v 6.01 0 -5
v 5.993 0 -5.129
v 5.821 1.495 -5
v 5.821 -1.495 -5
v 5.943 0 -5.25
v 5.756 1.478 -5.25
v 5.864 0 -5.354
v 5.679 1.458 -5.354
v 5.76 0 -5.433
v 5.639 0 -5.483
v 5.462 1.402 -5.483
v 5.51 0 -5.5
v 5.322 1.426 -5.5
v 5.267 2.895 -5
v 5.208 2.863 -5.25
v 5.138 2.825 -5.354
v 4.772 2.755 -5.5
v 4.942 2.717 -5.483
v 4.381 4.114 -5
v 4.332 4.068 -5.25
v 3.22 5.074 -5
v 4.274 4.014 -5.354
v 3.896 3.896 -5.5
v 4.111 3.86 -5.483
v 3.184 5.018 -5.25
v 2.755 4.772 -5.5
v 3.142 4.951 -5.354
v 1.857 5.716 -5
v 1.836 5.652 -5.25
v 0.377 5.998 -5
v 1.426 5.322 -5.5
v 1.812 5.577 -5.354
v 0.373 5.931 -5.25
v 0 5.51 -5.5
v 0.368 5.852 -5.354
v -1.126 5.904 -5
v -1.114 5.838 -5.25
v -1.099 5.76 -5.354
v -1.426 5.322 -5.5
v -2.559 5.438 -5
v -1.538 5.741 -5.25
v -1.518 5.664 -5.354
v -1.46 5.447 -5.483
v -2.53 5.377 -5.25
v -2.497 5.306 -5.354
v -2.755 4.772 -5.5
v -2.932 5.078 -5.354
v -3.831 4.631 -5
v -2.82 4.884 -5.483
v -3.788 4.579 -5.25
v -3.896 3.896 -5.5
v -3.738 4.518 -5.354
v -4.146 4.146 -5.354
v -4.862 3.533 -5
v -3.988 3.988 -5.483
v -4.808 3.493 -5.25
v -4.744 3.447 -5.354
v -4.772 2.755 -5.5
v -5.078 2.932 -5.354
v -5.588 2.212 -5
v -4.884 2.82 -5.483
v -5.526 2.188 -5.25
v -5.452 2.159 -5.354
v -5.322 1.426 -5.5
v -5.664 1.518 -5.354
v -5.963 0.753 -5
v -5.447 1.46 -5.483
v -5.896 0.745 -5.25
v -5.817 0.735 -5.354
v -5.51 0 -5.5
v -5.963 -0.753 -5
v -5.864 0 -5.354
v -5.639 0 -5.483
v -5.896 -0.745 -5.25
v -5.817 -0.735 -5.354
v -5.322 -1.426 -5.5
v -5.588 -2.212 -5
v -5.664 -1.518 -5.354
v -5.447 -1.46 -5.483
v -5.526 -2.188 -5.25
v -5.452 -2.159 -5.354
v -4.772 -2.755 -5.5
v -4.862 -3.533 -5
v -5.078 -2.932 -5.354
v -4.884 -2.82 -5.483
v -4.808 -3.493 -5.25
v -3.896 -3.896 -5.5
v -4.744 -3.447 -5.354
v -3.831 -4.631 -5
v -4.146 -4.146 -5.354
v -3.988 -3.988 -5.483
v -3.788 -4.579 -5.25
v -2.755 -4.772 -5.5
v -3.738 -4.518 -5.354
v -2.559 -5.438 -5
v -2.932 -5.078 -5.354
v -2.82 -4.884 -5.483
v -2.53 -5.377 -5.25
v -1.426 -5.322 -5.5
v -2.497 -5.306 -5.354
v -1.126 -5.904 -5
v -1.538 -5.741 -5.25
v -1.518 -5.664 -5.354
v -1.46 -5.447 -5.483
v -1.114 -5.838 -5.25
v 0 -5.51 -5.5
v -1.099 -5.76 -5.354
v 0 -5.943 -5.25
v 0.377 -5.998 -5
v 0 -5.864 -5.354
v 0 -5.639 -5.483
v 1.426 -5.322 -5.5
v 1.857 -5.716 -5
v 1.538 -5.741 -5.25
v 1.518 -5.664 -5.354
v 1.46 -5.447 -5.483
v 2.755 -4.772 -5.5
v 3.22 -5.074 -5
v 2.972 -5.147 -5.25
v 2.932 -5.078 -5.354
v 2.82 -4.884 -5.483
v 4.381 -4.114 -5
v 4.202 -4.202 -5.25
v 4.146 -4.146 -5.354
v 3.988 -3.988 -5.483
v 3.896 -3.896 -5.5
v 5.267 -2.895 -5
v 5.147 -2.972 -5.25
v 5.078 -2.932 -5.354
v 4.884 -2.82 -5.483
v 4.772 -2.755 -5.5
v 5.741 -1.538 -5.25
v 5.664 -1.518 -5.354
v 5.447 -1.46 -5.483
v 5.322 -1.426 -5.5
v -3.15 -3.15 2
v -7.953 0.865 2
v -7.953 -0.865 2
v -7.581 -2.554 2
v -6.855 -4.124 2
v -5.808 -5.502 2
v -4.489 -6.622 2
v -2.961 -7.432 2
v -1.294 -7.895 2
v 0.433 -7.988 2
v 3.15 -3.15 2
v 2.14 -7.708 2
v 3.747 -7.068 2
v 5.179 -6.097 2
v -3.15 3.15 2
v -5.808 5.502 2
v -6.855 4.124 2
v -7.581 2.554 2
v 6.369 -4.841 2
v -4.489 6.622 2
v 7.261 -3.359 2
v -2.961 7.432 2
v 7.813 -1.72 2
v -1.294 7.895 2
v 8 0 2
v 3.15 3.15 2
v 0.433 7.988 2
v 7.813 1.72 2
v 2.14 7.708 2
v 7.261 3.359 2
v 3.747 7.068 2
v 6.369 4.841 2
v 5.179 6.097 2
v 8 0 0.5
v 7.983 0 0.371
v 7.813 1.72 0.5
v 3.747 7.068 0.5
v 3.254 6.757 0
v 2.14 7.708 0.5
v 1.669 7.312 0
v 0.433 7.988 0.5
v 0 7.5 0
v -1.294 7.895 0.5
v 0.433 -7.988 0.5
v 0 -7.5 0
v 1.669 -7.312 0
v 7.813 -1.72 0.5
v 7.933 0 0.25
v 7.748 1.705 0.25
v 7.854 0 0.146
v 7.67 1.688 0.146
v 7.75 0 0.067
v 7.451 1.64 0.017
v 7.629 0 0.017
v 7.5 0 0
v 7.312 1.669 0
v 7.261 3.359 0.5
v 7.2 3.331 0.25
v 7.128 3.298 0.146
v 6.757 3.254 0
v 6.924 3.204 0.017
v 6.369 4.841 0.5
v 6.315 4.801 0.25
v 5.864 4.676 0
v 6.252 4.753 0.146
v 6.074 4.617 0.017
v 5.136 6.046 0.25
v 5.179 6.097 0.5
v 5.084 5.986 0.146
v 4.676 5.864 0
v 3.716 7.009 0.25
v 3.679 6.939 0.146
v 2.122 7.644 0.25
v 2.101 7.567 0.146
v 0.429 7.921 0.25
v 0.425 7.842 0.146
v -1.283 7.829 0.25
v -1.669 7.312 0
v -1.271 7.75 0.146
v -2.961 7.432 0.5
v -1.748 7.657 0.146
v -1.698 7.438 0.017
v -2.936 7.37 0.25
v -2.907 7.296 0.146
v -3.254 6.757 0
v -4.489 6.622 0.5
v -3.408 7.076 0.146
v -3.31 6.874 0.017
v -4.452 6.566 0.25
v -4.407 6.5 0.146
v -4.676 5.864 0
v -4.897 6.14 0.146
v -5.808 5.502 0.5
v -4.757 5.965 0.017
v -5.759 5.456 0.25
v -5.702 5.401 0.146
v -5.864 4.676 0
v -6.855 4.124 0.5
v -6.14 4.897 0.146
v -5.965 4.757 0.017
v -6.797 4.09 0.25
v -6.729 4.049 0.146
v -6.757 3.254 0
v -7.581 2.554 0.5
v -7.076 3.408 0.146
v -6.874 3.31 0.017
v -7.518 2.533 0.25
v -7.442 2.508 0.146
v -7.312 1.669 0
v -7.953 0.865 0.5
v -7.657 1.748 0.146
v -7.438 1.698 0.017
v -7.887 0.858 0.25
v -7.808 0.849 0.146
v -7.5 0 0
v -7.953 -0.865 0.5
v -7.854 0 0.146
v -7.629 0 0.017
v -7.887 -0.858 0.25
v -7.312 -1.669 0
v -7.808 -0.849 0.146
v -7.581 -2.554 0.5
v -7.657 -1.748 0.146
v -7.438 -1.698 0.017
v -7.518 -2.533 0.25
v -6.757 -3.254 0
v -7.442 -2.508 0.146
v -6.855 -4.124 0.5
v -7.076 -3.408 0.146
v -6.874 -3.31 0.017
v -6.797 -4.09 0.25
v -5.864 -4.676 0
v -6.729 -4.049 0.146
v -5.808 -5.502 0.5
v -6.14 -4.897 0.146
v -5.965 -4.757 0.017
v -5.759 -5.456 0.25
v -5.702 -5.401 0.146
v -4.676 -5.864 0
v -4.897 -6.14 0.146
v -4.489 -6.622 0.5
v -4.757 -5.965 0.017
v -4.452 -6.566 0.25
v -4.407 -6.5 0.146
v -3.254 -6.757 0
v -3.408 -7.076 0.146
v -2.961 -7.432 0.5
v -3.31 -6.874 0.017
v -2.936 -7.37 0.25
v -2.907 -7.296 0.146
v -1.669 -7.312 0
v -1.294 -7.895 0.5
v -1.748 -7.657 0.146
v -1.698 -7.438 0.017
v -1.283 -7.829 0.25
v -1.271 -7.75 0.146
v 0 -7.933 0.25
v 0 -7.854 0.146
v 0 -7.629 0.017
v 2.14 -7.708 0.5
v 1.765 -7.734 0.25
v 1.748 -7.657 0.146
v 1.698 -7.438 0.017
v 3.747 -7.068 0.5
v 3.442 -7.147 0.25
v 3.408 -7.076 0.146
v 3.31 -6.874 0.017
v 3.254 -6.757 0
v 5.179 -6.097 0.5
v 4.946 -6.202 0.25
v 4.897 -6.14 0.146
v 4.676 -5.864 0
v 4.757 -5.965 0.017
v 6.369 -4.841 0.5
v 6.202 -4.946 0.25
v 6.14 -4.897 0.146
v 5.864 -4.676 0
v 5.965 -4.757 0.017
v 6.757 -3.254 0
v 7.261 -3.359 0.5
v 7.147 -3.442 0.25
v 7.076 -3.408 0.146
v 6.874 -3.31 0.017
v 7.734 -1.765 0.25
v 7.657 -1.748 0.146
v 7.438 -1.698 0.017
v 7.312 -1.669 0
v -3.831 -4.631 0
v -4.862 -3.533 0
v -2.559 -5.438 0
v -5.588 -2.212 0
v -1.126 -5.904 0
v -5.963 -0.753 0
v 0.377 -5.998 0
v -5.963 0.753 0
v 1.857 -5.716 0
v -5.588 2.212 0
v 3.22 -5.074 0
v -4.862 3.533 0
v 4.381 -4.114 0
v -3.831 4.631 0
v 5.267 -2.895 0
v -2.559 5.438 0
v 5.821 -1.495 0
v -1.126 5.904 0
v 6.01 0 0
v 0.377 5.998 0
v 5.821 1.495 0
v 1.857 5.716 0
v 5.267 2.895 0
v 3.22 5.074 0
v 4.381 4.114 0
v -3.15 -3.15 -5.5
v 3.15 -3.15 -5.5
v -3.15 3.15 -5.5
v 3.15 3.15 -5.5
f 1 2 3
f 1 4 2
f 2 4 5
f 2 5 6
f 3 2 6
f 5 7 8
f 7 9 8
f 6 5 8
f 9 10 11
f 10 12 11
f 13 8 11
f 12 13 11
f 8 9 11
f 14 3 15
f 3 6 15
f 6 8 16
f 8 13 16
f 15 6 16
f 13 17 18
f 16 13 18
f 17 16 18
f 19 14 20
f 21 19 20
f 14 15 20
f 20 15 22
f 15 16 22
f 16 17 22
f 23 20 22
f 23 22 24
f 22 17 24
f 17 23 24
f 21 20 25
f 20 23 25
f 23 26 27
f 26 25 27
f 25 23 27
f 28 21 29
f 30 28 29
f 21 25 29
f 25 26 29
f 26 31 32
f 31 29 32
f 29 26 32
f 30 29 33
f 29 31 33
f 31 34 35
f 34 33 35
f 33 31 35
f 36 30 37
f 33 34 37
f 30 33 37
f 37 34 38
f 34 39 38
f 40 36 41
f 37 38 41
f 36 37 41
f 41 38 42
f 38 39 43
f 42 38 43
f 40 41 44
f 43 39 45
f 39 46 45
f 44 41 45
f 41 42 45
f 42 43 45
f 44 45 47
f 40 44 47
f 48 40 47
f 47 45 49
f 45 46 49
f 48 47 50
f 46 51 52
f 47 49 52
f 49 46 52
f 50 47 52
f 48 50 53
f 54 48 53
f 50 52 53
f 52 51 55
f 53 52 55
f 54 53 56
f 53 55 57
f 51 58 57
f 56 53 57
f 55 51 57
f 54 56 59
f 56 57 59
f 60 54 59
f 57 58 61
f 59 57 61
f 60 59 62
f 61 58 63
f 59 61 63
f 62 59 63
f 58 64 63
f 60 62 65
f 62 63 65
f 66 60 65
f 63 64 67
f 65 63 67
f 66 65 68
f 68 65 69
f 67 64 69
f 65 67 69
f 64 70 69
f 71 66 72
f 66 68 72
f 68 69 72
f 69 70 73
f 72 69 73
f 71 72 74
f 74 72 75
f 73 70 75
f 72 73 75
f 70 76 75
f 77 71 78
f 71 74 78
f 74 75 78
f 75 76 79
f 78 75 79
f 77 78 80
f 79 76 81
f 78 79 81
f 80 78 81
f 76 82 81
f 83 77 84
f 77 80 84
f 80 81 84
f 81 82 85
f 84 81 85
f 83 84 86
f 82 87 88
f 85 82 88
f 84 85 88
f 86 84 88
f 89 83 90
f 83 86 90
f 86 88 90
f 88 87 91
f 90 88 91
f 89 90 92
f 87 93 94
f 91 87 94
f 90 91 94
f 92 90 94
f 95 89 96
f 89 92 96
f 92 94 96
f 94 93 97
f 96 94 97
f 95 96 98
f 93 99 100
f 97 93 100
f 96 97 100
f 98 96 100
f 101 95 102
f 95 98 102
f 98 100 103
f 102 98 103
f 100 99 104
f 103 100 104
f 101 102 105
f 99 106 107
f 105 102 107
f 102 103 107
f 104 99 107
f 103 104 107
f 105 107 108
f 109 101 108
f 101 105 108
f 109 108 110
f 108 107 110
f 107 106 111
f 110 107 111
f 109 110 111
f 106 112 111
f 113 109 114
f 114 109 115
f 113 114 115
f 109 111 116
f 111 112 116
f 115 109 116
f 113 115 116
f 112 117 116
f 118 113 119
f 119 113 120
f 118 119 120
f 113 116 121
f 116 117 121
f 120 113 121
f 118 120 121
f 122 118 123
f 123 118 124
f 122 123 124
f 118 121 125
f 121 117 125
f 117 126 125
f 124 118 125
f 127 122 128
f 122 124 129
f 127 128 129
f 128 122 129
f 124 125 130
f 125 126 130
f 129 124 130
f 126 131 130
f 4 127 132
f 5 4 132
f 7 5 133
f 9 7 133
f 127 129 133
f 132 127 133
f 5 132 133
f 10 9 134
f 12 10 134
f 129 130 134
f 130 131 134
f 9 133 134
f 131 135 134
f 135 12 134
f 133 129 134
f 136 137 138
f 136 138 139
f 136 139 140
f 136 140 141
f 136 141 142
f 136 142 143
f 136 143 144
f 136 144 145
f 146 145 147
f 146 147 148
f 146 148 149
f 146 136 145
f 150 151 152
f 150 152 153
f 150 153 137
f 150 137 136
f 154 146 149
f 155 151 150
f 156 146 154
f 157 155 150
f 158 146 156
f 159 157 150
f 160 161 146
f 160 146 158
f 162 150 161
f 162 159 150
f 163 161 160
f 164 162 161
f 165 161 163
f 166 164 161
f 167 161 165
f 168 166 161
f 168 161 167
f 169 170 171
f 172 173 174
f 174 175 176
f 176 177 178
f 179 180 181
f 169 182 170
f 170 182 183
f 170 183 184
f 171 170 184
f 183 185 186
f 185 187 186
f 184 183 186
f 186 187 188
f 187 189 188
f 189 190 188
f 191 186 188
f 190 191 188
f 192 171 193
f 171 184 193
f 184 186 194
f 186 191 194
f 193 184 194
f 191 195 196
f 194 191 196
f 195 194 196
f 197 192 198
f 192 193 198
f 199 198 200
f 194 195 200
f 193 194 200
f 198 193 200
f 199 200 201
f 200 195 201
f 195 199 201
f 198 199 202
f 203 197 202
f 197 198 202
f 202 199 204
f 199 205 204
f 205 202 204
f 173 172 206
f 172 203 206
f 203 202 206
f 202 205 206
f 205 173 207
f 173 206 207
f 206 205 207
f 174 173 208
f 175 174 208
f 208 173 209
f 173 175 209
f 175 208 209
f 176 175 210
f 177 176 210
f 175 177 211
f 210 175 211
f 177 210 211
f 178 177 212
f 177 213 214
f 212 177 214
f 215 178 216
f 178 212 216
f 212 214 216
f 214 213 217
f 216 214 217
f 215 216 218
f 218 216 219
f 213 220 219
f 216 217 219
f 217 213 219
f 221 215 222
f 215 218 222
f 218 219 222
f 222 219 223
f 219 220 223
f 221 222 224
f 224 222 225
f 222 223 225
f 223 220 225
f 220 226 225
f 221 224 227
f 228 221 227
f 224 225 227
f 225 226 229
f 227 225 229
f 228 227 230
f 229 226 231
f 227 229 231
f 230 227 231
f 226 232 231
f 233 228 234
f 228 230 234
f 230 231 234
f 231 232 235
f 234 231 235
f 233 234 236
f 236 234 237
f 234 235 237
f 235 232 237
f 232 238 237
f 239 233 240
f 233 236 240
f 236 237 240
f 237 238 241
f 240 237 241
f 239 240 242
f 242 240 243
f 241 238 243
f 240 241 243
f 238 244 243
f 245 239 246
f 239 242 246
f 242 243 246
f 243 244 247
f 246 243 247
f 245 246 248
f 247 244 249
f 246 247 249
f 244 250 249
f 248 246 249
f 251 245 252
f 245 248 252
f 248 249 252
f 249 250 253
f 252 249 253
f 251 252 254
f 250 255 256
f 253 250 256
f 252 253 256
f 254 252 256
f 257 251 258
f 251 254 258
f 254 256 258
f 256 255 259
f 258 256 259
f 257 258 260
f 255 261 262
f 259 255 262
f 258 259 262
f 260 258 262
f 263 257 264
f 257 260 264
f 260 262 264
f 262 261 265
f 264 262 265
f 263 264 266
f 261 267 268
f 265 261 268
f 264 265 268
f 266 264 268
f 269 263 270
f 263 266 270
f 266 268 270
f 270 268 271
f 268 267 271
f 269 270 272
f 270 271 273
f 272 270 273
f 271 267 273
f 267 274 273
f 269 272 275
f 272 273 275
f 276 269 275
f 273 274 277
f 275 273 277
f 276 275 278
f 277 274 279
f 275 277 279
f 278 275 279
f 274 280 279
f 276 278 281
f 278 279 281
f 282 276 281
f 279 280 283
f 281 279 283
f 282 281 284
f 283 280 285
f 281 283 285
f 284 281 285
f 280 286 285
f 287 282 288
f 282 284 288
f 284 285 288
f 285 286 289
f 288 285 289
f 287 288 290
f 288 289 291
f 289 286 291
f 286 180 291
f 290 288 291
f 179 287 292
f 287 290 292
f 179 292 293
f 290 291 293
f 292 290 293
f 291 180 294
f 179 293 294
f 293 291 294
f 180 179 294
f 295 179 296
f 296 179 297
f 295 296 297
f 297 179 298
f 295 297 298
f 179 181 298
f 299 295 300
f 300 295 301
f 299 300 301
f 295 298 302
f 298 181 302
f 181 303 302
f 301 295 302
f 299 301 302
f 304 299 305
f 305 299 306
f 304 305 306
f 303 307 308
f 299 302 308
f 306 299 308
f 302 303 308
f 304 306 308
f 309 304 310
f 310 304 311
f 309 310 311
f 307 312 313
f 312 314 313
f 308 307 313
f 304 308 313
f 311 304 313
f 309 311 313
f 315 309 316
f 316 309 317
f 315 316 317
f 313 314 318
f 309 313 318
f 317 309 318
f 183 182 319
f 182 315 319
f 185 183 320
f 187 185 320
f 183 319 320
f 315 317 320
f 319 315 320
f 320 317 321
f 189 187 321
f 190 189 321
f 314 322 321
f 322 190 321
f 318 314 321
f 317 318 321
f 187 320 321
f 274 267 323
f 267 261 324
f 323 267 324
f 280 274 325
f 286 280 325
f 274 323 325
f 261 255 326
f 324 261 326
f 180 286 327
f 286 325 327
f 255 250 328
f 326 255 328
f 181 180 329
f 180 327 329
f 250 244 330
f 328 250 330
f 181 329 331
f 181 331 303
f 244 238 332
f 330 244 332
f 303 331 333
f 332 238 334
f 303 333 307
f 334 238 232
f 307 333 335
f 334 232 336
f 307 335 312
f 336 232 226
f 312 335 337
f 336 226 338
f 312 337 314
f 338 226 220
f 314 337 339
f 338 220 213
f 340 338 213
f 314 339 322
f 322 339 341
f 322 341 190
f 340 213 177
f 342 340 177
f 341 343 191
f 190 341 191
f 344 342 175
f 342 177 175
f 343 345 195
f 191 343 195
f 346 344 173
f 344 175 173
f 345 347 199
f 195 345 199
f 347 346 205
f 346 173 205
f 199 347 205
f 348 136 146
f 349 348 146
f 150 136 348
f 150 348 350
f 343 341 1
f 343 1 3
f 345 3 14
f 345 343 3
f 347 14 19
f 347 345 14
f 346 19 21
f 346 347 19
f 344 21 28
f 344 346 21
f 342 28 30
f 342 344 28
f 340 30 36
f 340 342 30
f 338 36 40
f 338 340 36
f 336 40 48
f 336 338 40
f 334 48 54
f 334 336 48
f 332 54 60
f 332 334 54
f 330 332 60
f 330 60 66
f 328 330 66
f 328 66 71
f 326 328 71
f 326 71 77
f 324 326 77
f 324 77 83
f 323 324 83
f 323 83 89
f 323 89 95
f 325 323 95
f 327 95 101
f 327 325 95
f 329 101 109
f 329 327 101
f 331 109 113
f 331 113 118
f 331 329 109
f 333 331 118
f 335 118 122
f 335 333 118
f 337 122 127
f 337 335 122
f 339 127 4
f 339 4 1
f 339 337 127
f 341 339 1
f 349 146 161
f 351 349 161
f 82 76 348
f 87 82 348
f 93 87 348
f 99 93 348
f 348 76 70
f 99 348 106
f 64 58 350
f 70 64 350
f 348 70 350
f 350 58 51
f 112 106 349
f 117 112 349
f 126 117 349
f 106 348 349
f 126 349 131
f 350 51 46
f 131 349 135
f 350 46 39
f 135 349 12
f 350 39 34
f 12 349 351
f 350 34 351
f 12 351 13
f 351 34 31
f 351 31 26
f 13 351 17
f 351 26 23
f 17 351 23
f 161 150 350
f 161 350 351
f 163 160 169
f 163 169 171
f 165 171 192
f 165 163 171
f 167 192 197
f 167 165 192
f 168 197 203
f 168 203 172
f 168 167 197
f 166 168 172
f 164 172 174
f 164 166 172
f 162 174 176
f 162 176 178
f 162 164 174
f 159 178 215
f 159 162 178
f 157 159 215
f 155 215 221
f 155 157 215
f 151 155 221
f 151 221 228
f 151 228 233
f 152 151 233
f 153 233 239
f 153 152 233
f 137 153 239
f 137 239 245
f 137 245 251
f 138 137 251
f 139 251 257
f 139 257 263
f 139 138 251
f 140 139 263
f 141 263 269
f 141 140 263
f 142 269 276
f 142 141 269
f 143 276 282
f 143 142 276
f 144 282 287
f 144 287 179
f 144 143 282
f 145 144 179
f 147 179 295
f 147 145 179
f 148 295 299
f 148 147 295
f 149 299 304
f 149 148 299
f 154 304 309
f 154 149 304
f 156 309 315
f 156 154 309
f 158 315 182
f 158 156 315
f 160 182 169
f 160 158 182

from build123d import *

# Parameters (mm, degrees)
SKETCH1_R           = 6.01
SKETCH1_W           = 6.3
SKETCH1_H           = 6.3
BOSS_EXTRUDE1_DEPTH = 5.5
SKETCH1_3_R         = 8
SKETCH1_3_W         = 6.3
SKETCH1_3_H         = 6.3
BOSS_EXTRUDE2_DEPTH = 2
FILLET1_R           = 0.5


with BuildPart() as part:
    # Sketch1 → Boss-Extrude1 (new body)
    with BuildSketch(Plane.XY):
        Circle(SKETCH1_R)
        Rectangle(SKETCH1_W, SKETCH1_H, mode=Mode.SUBTRACT)
    extrude(amount=-BOSS_EXTRUDE1_DEPTH)

    # Sketch1<3> → Boss-Extrude2 (add)
    with BuildSketch(Plane.XY):
        Circle(SKETCH1_3_R)
        Rectangle(SKETCH1_3_W, SKETCH1_3_H, mode=Mode.SUBTRACT)
    extrude(amount=BOSS_EXTRUDE2_DEPTH)

    # Fillet1
    fillet1_edges = [part.edges().sort_by_distance(p)[0] for p in [
        (-8, 0, 0),
        (-6.01, 0, -5.5),
    ]]
    fillet(fillet1_edges, radius=FILLET1_R)


solid = part.part
